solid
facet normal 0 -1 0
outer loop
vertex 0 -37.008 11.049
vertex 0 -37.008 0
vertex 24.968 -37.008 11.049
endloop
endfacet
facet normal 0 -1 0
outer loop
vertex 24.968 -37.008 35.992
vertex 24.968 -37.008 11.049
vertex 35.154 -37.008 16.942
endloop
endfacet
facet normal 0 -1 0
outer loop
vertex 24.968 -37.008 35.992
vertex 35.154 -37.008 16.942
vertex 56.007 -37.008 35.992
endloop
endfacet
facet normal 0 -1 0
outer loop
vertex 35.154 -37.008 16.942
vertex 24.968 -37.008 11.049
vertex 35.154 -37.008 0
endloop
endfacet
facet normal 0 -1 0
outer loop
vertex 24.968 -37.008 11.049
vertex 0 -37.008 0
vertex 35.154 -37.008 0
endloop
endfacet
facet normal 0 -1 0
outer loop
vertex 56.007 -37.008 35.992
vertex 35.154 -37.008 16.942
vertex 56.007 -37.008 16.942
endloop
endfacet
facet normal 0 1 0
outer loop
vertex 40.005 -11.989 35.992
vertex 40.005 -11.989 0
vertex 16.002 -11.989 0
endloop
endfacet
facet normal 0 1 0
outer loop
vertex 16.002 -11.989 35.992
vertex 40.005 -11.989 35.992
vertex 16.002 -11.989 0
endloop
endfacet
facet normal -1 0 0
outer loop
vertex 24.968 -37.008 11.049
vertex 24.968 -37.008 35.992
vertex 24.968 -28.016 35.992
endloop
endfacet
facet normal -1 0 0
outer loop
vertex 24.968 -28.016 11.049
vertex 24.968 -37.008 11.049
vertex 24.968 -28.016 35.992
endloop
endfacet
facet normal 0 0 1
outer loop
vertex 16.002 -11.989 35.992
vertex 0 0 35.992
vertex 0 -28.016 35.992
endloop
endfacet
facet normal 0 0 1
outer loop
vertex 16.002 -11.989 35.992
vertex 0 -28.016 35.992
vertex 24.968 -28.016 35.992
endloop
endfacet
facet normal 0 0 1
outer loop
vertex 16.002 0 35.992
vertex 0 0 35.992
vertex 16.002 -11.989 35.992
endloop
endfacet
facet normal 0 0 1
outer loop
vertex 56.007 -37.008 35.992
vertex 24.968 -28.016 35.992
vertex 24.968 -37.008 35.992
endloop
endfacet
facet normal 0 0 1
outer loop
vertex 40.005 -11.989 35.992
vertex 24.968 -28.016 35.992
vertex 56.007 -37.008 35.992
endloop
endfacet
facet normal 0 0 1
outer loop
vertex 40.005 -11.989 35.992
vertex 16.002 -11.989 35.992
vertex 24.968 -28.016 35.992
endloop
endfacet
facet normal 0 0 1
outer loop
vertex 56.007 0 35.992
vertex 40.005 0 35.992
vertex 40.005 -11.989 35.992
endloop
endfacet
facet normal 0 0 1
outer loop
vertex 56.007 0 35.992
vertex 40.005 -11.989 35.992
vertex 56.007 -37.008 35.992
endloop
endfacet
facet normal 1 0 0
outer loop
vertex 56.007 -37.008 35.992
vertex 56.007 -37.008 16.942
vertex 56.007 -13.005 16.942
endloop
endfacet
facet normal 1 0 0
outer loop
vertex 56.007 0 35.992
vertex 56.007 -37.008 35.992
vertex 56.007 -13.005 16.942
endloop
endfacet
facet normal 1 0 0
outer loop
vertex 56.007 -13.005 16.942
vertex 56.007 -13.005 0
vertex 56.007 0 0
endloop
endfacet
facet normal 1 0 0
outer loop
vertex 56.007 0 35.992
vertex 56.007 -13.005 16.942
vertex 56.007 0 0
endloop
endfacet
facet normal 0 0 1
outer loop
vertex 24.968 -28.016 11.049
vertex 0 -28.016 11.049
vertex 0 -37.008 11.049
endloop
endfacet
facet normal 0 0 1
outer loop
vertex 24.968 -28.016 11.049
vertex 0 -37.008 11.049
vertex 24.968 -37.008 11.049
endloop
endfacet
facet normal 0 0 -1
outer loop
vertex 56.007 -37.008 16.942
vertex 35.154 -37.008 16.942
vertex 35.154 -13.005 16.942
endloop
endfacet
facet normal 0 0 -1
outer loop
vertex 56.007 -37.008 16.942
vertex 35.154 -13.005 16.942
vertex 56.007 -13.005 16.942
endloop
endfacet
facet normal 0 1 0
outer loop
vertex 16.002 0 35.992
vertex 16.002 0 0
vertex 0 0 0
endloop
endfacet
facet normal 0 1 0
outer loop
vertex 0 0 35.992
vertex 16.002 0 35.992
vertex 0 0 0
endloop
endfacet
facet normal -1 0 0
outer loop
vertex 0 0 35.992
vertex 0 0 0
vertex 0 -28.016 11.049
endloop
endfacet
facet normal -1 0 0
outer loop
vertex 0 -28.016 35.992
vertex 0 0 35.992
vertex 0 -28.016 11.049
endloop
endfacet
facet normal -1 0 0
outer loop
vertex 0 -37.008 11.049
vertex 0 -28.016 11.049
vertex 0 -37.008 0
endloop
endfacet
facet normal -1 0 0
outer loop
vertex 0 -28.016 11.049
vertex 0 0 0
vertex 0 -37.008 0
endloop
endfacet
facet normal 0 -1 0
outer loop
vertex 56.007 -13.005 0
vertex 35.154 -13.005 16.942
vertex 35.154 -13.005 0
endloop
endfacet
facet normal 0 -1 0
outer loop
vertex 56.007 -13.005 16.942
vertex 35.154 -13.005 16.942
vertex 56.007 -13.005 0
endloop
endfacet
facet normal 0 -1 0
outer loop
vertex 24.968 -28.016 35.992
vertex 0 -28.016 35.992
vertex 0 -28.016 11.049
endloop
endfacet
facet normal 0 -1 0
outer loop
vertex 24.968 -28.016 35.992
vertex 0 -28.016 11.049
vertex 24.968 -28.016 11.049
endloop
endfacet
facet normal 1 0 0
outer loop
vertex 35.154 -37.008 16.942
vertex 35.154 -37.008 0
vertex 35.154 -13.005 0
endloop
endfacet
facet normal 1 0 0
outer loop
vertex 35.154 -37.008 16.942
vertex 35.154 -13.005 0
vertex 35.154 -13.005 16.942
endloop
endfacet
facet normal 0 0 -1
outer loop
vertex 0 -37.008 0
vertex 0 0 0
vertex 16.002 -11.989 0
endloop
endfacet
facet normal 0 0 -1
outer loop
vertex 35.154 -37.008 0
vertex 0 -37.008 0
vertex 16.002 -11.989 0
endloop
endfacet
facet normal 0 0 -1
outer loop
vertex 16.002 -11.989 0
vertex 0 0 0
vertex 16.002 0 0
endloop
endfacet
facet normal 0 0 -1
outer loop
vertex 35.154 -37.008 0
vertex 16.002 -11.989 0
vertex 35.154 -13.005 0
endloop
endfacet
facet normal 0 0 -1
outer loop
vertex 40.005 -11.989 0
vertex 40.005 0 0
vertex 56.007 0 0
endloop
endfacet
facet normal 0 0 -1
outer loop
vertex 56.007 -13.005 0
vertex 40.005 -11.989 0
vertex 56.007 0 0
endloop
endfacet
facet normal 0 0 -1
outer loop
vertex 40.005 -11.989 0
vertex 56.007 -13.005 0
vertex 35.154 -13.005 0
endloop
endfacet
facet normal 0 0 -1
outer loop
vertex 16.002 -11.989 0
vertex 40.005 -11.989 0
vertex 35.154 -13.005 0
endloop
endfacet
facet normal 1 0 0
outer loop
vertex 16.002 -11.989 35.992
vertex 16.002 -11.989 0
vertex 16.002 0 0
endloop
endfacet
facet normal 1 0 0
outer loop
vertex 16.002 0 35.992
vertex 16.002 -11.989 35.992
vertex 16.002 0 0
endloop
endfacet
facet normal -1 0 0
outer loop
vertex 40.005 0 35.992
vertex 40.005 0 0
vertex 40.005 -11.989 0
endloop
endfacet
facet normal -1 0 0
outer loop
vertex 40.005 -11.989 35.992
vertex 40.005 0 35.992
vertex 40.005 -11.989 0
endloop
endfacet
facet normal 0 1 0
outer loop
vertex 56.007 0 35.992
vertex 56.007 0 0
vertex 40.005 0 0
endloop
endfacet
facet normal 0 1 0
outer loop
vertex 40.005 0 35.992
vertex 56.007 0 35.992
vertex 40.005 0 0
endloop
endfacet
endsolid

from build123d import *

# Parameters (mm, degrees)
F1_DEPTH = 35.9918
F2_W     = 24.9682
F2_H     = 8.9916
F3_DEPTH = 24.9428
F4_W     = 20.8534
F4_H     = 16.9418
F5_DEPTH = 24.003


with BuildPart() as f1:
    # F0 (on Top) → F1 (new body)
    with BuildSketch(Plane.XY):
        Polygon((16.002, 0), (0, 0), (0, -37.0078), (56.007, -37.0078), (56.007, 0), (40.005, 0), (40.005, -11.9888), (16.002, -11.9888), align=None)
    extrude(amount=F1_DEPTH)

    # F2 (on face) → F3 (cut)
    with BuildSketch(Plane.XY.offset(35.9918)):
        with Locations((12.4841, -32.512)):
            Rectangle(F2_W, F2_H)
    extrude(amount=-F3_DEPTH, mode=Mode.SUBTRACT)

    # F4 (on face) → F5 (cut)
    with BuildSketch(Plane.XZ.offset(37.0078)):
        with Locations((45.5803, 8.4709)):
            Rectangle(F4_W, F4_H)
    extrude(amount=-F5_DEPTH, mode=Mode.SUBTRACT)


solid = f1.part
